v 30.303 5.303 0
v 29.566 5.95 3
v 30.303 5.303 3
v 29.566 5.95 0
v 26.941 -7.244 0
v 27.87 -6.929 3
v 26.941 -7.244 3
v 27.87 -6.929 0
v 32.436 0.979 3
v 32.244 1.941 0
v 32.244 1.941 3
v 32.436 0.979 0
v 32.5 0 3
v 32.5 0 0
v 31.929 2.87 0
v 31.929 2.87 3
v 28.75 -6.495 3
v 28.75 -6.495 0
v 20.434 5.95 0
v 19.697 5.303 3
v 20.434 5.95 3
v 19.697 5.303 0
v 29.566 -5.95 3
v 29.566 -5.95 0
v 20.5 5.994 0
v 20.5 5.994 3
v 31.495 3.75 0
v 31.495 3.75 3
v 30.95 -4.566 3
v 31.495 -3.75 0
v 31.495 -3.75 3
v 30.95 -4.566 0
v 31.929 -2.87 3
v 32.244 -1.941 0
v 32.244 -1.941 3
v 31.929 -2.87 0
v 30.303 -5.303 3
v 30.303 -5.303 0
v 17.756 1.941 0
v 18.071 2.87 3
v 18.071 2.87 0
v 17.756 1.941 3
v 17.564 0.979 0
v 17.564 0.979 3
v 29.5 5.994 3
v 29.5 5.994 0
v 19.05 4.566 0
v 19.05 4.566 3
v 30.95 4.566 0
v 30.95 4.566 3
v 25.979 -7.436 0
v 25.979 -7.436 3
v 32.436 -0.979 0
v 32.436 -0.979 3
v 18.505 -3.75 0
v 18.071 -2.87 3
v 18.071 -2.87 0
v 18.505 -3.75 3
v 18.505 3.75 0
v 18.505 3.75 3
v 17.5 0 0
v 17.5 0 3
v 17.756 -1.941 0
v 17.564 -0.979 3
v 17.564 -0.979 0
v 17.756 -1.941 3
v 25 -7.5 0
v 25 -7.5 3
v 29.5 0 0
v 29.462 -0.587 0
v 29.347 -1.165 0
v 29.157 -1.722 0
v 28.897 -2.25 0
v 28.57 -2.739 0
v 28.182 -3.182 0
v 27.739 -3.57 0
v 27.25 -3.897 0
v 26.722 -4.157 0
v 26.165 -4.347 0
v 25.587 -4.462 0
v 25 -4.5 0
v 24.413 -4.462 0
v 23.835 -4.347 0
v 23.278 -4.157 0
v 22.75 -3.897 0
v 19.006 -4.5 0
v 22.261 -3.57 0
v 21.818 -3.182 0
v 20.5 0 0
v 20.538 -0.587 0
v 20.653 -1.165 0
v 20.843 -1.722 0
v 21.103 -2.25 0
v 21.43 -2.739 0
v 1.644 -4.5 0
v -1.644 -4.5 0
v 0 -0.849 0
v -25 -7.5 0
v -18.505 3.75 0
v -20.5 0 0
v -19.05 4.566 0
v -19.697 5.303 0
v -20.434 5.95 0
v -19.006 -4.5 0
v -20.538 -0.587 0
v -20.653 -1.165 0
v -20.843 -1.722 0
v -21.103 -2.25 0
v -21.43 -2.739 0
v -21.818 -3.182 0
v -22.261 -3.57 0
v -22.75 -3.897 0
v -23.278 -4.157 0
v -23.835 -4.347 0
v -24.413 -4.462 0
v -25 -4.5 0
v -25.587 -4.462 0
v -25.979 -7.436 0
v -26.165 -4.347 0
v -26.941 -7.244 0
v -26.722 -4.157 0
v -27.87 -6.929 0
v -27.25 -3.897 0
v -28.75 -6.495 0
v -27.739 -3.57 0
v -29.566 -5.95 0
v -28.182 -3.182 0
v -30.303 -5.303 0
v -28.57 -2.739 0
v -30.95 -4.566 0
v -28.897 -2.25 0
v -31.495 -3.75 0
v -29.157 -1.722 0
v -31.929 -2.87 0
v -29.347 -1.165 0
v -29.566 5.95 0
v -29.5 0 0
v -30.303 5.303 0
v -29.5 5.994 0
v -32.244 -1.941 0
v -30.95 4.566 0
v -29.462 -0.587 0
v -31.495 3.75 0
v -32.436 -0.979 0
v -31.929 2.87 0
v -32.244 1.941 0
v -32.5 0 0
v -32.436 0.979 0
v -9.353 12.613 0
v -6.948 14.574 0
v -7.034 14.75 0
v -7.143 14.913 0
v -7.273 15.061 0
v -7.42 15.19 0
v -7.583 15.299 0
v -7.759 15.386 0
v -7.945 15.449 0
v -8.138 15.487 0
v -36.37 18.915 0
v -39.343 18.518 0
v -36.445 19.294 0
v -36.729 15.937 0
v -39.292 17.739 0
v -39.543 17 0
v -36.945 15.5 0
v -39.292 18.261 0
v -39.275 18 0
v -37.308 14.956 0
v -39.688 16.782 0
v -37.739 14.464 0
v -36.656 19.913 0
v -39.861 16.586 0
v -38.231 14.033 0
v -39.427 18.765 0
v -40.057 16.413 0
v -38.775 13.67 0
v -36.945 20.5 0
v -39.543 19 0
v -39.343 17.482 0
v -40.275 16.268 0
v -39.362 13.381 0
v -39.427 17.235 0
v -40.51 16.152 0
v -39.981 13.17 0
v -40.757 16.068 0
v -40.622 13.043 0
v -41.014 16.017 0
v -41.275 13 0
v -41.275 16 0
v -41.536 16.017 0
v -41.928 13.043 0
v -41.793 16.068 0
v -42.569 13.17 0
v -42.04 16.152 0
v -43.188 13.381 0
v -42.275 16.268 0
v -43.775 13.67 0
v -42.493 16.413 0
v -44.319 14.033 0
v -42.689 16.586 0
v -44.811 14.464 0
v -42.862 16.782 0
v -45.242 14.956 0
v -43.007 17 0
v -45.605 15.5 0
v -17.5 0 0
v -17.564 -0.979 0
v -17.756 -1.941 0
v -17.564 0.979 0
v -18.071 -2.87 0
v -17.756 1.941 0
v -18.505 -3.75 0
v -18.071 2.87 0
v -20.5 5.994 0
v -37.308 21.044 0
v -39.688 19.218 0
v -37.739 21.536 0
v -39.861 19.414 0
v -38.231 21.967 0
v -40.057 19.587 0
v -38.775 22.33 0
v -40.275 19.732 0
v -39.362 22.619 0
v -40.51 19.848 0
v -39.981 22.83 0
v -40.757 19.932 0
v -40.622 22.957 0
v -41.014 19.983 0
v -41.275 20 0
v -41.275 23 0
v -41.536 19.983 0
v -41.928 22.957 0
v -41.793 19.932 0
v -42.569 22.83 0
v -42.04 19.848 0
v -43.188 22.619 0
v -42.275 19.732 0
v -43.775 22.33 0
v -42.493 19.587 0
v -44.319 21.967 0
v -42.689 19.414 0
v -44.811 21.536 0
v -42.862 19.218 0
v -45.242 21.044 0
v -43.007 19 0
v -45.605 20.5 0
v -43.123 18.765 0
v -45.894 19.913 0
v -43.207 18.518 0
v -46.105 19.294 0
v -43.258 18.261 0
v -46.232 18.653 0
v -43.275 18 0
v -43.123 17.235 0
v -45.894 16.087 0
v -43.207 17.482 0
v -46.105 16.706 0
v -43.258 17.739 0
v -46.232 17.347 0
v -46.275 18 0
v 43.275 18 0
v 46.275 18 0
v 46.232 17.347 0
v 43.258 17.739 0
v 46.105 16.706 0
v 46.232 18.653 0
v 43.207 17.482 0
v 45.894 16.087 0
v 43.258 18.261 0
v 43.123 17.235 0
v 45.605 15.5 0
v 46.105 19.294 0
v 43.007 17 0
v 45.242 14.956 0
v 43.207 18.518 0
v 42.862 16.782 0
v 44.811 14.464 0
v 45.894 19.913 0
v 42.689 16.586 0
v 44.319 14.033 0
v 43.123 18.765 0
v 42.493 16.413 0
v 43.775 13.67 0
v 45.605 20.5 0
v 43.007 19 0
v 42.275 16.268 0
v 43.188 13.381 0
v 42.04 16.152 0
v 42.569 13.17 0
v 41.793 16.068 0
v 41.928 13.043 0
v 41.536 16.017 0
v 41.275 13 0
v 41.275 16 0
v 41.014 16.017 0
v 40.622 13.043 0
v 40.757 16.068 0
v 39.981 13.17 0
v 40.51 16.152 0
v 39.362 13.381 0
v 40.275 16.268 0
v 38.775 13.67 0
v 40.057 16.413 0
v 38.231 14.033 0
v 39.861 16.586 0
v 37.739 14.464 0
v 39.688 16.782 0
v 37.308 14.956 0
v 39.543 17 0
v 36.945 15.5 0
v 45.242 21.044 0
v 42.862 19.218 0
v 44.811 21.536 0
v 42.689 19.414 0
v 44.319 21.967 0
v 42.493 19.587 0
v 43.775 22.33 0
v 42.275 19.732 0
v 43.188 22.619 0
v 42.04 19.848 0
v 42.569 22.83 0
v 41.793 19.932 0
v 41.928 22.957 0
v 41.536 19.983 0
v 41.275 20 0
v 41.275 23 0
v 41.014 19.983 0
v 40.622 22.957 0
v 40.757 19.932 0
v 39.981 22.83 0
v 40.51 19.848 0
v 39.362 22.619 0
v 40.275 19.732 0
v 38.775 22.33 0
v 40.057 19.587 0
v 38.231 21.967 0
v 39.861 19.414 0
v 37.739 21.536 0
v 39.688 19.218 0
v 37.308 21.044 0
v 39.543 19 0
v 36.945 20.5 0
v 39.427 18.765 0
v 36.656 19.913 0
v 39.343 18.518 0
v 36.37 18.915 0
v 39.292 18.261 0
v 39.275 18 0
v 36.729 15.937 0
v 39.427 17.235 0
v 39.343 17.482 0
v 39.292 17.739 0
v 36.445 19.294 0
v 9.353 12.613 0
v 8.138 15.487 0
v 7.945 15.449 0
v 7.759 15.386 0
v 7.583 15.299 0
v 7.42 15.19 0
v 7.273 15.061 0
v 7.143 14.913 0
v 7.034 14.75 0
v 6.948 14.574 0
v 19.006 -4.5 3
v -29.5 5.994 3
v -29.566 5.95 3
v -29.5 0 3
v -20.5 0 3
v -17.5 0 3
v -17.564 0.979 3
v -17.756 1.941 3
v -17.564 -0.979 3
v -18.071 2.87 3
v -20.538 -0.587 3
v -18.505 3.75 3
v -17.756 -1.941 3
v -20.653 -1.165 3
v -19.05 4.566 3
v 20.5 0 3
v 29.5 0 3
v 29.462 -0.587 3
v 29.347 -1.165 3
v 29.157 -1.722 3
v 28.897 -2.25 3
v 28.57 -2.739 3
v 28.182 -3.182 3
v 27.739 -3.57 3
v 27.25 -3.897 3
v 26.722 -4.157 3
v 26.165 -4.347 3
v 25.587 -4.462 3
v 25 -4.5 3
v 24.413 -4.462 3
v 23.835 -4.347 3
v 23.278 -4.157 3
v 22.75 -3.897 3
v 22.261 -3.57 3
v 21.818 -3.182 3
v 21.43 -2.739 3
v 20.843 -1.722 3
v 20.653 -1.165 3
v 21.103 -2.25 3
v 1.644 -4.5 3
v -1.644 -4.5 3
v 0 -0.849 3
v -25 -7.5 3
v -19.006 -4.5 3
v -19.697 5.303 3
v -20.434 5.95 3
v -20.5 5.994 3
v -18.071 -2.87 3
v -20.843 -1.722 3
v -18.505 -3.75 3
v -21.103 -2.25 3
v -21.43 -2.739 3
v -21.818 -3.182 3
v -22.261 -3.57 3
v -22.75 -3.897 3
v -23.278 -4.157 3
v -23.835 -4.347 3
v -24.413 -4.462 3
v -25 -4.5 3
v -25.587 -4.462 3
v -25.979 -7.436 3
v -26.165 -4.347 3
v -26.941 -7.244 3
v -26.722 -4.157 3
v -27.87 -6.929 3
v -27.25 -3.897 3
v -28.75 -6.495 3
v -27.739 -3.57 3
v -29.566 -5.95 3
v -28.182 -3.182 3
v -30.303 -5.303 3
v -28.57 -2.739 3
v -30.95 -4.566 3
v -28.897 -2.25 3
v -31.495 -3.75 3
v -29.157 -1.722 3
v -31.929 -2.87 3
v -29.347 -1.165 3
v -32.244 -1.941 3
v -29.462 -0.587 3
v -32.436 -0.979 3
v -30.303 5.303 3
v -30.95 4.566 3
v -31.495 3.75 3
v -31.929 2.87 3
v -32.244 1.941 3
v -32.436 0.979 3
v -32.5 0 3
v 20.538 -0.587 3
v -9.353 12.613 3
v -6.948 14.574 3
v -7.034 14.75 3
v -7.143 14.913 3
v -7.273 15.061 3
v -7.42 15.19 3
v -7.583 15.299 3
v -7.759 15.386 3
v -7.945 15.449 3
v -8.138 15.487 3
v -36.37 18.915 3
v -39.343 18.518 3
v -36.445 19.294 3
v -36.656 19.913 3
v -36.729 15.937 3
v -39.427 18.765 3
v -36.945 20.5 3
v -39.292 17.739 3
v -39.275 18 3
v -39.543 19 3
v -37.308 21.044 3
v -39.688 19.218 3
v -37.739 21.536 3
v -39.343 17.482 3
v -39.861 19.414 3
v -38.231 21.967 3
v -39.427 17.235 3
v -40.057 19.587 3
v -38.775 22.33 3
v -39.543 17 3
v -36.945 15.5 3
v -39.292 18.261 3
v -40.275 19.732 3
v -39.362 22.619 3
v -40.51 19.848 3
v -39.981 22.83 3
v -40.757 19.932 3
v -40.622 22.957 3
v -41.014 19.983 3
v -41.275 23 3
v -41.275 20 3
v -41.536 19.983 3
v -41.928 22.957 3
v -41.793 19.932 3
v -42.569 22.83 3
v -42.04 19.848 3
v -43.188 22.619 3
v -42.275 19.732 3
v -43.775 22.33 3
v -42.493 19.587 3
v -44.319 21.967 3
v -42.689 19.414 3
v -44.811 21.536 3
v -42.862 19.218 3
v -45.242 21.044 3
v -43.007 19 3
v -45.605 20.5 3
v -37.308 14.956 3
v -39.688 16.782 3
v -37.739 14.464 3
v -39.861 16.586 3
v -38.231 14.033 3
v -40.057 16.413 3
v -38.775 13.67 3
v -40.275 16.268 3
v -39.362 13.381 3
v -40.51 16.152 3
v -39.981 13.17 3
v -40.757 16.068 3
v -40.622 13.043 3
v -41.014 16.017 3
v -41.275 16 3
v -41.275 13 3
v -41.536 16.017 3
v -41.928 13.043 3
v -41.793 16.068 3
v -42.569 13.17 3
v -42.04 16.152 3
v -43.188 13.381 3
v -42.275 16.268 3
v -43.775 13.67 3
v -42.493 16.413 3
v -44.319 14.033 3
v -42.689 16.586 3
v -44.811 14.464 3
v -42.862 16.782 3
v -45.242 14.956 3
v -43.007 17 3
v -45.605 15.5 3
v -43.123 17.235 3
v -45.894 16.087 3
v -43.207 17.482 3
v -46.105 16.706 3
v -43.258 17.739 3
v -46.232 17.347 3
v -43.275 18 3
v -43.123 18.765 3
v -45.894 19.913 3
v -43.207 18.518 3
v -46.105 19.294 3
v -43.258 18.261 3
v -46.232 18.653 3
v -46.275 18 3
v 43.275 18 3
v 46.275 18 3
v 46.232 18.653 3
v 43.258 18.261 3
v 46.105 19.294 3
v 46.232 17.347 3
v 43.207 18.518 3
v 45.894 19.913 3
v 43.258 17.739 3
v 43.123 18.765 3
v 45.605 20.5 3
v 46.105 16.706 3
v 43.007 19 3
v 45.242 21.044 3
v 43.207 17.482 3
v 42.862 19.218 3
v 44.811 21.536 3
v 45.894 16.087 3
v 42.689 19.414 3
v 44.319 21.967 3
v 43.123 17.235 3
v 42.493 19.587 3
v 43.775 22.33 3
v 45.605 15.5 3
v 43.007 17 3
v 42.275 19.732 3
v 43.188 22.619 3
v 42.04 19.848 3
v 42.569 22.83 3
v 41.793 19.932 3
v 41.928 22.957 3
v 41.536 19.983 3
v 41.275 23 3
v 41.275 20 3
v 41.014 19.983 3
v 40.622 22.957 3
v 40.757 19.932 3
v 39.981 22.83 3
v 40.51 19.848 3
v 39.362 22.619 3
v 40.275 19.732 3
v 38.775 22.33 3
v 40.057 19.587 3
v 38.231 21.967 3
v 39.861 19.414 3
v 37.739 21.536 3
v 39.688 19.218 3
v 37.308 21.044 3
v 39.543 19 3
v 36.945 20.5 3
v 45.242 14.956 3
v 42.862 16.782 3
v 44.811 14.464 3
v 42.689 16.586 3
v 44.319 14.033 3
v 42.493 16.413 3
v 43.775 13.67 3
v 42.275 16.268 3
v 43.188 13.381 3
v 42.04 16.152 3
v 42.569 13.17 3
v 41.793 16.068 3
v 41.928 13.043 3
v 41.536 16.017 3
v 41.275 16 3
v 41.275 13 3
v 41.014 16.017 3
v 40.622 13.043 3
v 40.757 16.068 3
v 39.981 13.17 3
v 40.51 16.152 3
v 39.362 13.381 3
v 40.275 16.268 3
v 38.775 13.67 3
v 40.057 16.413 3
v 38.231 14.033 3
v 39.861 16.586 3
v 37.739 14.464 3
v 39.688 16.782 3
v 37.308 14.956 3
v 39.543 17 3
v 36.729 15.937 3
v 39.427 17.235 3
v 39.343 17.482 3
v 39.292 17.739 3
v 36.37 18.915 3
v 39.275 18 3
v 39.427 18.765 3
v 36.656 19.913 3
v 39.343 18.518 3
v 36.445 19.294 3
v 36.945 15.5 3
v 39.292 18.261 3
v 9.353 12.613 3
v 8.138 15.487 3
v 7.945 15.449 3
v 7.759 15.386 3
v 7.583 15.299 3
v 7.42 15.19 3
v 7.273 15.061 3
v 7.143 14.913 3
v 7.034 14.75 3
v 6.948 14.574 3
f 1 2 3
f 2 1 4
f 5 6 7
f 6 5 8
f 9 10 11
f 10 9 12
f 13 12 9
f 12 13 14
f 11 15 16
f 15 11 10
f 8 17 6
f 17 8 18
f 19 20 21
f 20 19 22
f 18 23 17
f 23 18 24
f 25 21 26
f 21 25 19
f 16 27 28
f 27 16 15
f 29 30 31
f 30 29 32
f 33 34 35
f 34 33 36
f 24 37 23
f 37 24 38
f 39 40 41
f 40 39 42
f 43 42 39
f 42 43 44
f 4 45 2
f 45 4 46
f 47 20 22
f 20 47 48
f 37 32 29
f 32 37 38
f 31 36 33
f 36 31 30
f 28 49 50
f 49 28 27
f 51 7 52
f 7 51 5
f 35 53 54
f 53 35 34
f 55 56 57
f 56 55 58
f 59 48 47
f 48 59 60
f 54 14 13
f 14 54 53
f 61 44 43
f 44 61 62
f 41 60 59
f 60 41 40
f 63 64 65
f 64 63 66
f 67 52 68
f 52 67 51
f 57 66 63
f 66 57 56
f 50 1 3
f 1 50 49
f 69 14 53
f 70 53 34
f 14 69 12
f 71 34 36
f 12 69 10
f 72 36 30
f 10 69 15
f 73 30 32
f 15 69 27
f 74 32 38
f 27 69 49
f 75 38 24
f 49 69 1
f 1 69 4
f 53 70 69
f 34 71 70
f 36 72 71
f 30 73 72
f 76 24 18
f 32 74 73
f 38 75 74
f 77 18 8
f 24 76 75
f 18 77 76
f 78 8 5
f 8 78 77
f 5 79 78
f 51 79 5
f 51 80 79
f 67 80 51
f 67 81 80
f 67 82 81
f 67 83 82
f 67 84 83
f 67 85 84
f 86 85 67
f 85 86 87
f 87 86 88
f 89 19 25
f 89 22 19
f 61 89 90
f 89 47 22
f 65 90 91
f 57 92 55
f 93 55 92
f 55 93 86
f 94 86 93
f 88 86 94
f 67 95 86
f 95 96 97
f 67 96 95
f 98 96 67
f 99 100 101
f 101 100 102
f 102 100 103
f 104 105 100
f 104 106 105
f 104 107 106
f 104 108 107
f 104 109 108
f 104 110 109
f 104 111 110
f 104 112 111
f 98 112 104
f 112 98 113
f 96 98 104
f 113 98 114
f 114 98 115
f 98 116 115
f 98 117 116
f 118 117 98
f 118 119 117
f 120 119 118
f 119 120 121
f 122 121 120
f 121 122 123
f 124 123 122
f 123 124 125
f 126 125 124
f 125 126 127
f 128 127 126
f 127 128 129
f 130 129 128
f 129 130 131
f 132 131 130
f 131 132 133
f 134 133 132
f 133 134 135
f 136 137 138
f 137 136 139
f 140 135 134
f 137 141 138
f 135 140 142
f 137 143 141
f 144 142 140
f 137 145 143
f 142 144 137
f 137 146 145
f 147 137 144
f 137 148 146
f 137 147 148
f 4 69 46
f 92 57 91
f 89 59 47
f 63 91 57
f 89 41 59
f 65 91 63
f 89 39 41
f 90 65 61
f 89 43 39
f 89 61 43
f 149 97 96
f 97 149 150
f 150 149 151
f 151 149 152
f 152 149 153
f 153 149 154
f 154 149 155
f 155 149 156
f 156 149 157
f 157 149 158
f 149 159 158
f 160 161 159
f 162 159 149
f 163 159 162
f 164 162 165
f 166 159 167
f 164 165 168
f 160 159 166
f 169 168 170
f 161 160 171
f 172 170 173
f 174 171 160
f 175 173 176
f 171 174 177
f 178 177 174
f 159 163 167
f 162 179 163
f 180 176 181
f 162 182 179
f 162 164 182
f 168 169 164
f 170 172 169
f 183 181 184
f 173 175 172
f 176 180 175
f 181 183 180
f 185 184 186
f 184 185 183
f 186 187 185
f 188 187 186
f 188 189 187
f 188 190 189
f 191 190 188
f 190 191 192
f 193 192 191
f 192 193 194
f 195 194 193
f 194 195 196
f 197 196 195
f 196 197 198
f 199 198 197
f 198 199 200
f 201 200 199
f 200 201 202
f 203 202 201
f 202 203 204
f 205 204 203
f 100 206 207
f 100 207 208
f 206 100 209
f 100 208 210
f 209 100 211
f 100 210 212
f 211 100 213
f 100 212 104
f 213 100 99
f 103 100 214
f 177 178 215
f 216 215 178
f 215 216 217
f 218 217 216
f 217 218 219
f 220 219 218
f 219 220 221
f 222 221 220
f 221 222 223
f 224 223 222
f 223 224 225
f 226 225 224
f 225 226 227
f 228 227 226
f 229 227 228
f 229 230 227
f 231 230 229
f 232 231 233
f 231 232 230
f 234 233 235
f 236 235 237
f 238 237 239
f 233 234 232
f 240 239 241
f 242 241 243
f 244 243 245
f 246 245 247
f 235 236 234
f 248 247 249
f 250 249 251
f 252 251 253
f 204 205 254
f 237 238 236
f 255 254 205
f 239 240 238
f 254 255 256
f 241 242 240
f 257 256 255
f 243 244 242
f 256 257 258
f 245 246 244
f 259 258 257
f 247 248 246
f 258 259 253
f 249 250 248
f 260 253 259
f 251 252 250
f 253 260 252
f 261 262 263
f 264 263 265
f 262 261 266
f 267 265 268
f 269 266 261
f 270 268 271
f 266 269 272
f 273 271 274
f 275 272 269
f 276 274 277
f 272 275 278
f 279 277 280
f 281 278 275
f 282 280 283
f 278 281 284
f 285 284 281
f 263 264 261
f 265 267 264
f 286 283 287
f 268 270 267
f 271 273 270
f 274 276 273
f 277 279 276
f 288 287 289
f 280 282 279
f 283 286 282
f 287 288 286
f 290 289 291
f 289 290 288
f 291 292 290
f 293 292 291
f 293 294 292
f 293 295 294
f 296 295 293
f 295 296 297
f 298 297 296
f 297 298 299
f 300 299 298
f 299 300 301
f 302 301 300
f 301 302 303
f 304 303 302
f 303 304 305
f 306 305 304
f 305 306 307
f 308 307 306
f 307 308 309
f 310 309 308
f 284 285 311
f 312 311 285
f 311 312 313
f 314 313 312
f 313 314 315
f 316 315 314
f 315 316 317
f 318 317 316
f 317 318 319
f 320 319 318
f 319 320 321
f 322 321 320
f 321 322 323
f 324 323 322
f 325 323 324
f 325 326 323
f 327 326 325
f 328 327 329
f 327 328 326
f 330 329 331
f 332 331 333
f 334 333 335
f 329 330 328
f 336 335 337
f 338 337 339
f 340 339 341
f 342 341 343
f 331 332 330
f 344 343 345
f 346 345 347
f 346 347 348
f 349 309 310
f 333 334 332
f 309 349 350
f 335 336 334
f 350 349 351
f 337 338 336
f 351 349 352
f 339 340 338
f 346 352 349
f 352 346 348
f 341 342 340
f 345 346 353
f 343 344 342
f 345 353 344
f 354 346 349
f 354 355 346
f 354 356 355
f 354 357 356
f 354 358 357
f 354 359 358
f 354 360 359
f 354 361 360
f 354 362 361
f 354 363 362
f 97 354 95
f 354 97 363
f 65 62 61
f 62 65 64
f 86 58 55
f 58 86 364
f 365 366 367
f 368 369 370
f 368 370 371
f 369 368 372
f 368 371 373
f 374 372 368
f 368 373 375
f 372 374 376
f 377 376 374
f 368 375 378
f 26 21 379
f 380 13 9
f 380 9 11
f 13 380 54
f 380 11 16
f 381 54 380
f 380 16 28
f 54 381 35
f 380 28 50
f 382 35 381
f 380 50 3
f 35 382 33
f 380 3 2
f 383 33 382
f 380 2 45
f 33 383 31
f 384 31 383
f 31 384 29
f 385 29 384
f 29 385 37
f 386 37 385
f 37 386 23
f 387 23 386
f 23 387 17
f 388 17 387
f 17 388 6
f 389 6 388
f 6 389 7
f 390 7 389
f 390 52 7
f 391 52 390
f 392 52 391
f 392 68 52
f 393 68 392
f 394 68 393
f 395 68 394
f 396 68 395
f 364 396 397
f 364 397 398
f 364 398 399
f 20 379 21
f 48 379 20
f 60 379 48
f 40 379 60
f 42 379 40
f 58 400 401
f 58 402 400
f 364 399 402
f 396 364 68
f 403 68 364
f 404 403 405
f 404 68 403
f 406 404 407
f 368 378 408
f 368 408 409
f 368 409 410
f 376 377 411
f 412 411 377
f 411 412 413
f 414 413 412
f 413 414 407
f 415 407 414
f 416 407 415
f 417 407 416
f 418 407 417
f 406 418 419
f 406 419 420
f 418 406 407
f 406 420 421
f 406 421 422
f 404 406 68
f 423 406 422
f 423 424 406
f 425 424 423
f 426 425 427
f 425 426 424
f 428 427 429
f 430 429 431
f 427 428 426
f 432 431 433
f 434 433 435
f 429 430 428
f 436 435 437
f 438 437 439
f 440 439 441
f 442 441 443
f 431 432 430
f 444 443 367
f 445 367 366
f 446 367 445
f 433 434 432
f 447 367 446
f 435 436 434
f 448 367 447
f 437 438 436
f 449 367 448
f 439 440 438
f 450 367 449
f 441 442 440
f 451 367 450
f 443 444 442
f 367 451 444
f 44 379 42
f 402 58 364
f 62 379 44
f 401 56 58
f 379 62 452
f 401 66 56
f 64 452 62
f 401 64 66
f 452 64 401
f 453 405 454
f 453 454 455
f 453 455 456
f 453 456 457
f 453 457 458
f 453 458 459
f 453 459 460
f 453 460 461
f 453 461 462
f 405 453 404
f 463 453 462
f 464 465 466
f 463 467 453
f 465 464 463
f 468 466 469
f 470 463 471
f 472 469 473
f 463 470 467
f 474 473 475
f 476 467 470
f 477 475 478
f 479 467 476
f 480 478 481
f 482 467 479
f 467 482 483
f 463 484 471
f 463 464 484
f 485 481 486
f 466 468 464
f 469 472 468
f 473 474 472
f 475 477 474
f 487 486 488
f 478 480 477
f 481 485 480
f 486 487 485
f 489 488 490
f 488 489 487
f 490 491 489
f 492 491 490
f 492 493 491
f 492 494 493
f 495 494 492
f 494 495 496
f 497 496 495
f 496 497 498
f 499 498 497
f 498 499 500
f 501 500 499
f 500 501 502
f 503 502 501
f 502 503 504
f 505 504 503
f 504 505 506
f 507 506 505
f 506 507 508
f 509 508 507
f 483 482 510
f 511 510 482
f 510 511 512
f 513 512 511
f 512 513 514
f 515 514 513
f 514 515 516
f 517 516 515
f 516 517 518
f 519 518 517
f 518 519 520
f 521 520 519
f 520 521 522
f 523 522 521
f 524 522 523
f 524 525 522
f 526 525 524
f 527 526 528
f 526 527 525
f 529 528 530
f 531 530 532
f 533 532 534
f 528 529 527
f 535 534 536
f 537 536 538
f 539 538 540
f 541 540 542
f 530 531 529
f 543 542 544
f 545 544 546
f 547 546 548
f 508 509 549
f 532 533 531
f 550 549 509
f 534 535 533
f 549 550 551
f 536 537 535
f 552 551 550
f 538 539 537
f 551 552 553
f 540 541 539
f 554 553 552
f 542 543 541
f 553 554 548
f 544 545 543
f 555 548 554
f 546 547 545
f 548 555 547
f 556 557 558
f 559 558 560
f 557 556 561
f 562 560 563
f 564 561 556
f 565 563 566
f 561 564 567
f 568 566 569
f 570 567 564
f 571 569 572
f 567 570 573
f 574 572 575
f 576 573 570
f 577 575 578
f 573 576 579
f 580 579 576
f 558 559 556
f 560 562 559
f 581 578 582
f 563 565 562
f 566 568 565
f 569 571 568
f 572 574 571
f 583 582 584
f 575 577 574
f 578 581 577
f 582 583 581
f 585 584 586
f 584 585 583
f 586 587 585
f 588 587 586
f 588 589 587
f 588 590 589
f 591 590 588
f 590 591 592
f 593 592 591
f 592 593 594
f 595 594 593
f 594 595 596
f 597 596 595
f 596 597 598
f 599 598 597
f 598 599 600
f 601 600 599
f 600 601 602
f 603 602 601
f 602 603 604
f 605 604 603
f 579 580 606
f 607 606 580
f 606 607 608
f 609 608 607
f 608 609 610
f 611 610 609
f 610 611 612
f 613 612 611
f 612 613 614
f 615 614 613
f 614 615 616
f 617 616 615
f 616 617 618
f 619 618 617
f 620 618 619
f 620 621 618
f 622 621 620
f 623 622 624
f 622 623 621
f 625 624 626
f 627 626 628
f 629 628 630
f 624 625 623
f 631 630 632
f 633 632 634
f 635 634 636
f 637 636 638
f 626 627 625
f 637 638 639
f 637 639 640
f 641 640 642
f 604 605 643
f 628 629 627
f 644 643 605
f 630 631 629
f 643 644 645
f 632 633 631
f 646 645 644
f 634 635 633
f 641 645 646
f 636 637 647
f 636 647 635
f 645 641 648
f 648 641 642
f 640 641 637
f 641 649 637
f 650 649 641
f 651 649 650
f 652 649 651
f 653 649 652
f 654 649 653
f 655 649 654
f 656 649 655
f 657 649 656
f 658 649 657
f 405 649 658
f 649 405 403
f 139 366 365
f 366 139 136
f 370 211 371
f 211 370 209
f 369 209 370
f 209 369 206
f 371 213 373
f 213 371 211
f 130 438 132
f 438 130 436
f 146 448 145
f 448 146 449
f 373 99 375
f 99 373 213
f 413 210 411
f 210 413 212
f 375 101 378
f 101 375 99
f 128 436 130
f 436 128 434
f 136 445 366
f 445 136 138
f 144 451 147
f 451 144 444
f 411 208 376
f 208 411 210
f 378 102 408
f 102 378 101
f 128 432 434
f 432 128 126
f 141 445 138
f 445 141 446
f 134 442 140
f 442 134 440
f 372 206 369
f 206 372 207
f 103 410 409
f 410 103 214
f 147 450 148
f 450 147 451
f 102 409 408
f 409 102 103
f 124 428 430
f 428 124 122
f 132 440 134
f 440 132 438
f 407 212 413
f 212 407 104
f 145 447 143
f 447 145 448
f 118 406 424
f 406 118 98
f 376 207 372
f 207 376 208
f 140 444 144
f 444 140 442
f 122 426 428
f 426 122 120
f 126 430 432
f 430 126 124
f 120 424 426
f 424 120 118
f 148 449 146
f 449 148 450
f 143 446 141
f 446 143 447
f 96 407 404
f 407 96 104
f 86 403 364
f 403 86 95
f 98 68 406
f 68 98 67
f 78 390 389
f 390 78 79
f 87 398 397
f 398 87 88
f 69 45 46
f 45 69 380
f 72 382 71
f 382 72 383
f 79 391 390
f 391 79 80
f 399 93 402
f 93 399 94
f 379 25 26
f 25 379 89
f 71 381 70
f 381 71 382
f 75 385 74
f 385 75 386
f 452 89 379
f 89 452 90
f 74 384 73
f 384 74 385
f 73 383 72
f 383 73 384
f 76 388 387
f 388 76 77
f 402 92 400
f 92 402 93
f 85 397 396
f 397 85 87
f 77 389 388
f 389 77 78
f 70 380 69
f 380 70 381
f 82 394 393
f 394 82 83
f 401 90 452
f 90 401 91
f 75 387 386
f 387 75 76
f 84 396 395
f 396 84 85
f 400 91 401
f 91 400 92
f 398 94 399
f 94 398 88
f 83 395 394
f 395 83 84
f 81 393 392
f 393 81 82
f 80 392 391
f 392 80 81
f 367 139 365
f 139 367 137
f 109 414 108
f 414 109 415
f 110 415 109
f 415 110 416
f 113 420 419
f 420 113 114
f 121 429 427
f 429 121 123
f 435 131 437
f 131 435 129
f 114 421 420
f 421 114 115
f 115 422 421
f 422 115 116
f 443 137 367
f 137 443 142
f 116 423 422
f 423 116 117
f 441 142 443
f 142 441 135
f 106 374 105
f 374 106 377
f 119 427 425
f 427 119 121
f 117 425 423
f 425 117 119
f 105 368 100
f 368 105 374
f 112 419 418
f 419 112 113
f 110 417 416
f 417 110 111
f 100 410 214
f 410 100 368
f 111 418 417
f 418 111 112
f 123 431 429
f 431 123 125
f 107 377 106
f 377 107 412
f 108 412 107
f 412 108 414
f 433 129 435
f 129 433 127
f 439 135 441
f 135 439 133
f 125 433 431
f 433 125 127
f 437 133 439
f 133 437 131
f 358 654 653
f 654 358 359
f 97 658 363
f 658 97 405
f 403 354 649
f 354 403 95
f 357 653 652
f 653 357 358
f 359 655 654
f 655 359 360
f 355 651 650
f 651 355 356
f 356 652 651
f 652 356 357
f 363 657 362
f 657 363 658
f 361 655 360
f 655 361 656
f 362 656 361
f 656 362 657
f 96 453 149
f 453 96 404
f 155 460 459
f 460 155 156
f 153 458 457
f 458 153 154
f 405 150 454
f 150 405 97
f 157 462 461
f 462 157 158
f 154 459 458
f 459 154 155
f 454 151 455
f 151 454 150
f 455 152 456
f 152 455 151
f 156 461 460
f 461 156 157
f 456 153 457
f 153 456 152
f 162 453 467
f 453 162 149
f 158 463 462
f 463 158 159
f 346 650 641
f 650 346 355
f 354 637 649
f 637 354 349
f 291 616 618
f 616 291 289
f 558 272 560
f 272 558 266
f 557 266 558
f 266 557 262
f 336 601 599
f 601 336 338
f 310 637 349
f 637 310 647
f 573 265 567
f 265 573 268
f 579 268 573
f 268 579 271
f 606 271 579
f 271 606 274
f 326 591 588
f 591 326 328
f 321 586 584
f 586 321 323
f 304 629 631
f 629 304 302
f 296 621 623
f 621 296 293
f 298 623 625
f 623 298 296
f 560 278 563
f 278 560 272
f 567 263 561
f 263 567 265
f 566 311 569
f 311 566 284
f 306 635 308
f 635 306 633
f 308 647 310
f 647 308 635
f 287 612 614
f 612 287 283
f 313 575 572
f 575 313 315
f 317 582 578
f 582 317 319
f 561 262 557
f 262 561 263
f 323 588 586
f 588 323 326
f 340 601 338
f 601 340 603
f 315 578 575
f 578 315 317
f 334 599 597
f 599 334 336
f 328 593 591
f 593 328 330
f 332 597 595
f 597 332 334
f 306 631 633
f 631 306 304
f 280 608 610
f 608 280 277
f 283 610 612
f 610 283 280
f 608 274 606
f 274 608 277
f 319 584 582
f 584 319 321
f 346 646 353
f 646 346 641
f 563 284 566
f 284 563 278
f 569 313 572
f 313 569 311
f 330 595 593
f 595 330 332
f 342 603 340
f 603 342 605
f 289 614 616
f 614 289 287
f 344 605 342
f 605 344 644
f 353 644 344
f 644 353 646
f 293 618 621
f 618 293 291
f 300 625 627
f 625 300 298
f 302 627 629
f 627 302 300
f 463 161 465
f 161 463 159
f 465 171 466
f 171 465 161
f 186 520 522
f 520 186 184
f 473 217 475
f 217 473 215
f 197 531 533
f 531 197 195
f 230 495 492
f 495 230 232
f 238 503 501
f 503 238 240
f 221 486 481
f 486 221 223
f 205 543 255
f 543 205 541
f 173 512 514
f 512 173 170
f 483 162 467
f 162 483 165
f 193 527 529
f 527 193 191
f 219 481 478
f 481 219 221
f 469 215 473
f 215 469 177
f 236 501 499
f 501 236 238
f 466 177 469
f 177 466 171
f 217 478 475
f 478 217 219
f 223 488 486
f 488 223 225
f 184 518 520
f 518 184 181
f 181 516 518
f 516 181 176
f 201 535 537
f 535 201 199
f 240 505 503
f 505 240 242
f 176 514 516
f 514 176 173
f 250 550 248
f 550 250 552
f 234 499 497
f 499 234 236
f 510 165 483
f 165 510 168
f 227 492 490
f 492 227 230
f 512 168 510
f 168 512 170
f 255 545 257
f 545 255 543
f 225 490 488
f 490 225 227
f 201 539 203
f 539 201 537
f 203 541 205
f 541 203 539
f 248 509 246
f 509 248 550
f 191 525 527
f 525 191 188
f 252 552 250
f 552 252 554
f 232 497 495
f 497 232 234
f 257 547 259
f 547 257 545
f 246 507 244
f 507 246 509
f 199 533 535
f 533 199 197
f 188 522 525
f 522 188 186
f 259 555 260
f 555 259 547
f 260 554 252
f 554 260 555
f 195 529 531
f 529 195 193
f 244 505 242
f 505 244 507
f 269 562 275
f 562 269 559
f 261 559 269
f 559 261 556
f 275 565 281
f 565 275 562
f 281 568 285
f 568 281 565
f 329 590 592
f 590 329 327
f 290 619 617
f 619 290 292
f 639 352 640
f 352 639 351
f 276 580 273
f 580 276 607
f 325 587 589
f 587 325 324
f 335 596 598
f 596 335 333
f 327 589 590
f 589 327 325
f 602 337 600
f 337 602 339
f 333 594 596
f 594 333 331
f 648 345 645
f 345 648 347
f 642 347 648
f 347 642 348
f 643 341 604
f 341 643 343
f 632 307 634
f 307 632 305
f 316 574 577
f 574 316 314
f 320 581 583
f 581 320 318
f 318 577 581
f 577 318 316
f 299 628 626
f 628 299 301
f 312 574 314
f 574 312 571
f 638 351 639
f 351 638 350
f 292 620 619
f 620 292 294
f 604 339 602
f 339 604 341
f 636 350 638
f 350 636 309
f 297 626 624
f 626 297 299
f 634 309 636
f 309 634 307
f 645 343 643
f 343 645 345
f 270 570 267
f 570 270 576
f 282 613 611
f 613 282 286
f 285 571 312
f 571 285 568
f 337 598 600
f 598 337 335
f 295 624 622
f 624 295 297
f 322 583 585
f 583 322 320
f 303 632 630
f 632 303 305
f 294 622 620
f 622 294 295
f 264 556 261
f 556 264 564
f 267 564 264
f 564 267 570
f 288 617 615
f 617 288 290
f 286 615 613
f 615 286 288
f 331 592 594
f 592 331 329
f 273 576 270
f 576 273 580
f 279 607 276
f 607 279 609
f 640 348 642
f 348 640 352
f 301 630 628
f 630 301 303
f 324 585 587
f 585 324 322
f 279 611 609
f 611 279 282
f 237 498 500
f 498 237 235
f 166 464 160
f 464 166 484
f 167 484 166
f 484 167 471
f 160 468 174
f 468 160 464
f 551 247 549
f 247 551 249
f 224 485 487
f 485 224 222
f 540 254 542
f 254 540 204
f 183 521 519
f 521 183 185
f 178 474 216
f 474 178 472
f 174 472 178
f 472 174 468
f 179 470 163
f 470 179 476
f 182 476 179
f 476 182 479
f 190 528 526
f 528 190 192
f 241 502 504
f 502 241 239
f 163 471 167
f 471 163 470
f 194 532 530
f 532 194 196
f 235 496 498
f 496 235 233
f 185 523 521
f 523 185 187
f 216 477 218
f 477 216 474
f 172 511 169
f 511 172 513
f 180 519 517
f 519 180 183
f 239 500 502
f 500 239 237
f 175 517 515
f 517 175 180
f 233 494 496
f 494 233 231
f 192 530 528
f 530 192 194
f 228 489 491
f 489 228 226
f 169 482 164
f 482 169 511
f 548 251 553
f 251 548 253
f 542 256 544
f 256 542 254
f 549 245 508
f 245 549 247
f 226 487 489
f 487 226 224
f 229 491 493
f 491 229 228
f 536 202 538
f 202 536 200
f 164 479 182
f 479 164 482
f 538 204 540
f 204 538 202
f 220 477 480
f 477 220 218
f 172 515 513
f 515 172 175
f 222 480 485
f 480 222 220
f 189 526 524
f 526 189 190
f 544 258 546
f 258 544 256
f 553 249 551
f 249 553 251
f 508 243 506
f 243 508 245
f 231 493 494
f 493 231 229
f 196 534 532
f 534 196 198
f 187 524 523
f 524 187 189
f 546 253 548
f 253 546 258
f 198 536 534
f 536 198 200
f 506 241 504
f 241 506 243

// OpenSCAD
//Distance Between the X Axis Bars
X_Bar_Distance=50;

//The Diameter of the X Axis Bars
X_Bar_Diameter=9; 

//The Distance Between the Screw Holes on the Fan
Fan_Screw_Distance=82.55; 

//The Diameter of the Screw to Hold the Fan in Place
Fan_Screw_Diameter=4;

//The Thickness of the Holder. This affects the thickness on the Z axis as well as on the X/Y Axis
Overall_Thickness=3;

//The Resolution of the Holder
Resolution=48; 

//Ignore this variable
$fn=Resolution;

fan_holder();

module fan_holder(){
difference(){
	union(){
	
	
		translate([X_Bar_Distance/2,0,0])
			cylinder(Overall_Thickness, (X_Bar_Diameter)/2+Overall_Thickness,(X_Bar_Diameter)/2+Overall_Thickness);
		
		translate([X_Bar_Distance/-2,0,0])
			cylinder(Overall_Thickness, (X_Bar_Diameter)/2+Overall_Thickness,(X_Bar_Diameter)/2+Overall_Thickness);
		
		translate([0,(X_Bar_Diameter+Overall_Thickness)/-2,Overall_Thickness/2])
		cube([X_Bar_Distance,Overall_Thickness, Overall_Thickness],center = true);
	
	}
		hull(){
		
		translate([X_Bar_Distance/2,0,-1])
			cylinder(Overall_Thickness+2, (X_Bar_Diameter)/2,(X_Bar_Diameter)/2);
		
		translate([X_Bar_Distance/2,X_Bar_Diameter*3,-1])
			cylinder(Overall_Thickness+2, (X_Bar_Diameter)/2,(X_Bar_Diameter)/2);
	
	}

	hull(){
		translate([X_Bar_Distance/-2,0,-1])
			cylinder(Overall_Thickness+2, (X_Bar_Diameter)/2,(X_Bar_Diameter)/2);
		
		translate([X_Bar_Distance/-2,X_Bar_Diameter*3,-1])
			cylinder(Overall_Thickness+2, (X_Bar_Diameter)/2,(X_Bar_Diameter)/2);
	
	}

}
difference(){
union(){

hull(){
translate([0,(X_Bar_Diameter)/-2,0])
cylinder(Overall_Thickness,(Overall_Thickness)/2,(Overall_Thickness)/2);

translate([X_Bar_Distance/6,(X_Bar_Diameter+Overall_Thickness+2),0])
cylinder(Overall_Thickness,(Overall_Thickness)/2,(Overall_Thickness)/2);
}

hull(){
translate([0,(X_Bar_Diameter)/-2,0])
cylinder(Overall_Thickness,(Overall_Thickness)/2,(Overall_Thickness)/2);

translate([X_Bar_Distance/-6,(X_Bar_Diameter+Overall_Thickness+2),0])
cylinder(Overall_Thickness,(Overall_Thickness)/2,(Overall_Thickness)/2);
}

hull(){
translate([X_Bar_Distance/-6,(X_Bar_Diameter+Overall_Thickness+2),0])
cylinder(Overall_Thickness,(Overall_Thickness)/2,(Overall_Thickness)/2);

translate([Fan_Screw_Distance/-2,(X_Bar_Diameter+Overall_Thickness)*1.5,0])
cylinder(Overall_Thickness,(Overall_Thickness)/2,(Overall_Thickness)/2);
}

hull(){
translate([X_Bar_Distance/6,(X_Bar_Diameter+Overall_Thickness+2),0])
cylinder(Overall_Thickness,(Overall_Thickness)/2,(Overall_Thickness)/2);

translate([Fan_Screw_Distance/2,(X_Bar_Diameter+Overall_Thickness)*1.5,0])
cylinder(Overall_Thickness,(Overall_Thickness)/2,(Overall_Thickness)/2);
}

translate([Fan_Screw_Distance/2,(X_Bar_Diameter+Overall_Thickness)*1.5,0])
cylinder(Overall_Thickness,(Fan_Screw_Diameter)/2+Overall_Thickness,(Fan_Screw_Diameter)/2+Overall_Thickness);

translate([Fan_Screw_Distance/-2,(X_Bar_Diameter+Overall_Thickness)*1.5,0])
cylinder(Overall_Thickness,(Fan_Screw_Diameter)/2+Overall_Thickness,(Fan_Screw_Diameter)/2+Overall_Thickness);

}

translate([Fan_Screw_Distance/2,(X_Bar_Diameter+Overall_Thickness)*1.5,-1])
cylinder(Overall_Thickness+2,(Fan_Screw_Diameter)/2,(Fan_Screw_Diameter)/2);

translate([Fan_Screw_Distance/-2,(X_Bar_Diameter+Overall_Thickness)*1.5,-1])
cylinder(Overall_Thickness+2,(Fan_Screw_Diameter)/2,(Fan_Screw_Diameter)/2);

}
}
